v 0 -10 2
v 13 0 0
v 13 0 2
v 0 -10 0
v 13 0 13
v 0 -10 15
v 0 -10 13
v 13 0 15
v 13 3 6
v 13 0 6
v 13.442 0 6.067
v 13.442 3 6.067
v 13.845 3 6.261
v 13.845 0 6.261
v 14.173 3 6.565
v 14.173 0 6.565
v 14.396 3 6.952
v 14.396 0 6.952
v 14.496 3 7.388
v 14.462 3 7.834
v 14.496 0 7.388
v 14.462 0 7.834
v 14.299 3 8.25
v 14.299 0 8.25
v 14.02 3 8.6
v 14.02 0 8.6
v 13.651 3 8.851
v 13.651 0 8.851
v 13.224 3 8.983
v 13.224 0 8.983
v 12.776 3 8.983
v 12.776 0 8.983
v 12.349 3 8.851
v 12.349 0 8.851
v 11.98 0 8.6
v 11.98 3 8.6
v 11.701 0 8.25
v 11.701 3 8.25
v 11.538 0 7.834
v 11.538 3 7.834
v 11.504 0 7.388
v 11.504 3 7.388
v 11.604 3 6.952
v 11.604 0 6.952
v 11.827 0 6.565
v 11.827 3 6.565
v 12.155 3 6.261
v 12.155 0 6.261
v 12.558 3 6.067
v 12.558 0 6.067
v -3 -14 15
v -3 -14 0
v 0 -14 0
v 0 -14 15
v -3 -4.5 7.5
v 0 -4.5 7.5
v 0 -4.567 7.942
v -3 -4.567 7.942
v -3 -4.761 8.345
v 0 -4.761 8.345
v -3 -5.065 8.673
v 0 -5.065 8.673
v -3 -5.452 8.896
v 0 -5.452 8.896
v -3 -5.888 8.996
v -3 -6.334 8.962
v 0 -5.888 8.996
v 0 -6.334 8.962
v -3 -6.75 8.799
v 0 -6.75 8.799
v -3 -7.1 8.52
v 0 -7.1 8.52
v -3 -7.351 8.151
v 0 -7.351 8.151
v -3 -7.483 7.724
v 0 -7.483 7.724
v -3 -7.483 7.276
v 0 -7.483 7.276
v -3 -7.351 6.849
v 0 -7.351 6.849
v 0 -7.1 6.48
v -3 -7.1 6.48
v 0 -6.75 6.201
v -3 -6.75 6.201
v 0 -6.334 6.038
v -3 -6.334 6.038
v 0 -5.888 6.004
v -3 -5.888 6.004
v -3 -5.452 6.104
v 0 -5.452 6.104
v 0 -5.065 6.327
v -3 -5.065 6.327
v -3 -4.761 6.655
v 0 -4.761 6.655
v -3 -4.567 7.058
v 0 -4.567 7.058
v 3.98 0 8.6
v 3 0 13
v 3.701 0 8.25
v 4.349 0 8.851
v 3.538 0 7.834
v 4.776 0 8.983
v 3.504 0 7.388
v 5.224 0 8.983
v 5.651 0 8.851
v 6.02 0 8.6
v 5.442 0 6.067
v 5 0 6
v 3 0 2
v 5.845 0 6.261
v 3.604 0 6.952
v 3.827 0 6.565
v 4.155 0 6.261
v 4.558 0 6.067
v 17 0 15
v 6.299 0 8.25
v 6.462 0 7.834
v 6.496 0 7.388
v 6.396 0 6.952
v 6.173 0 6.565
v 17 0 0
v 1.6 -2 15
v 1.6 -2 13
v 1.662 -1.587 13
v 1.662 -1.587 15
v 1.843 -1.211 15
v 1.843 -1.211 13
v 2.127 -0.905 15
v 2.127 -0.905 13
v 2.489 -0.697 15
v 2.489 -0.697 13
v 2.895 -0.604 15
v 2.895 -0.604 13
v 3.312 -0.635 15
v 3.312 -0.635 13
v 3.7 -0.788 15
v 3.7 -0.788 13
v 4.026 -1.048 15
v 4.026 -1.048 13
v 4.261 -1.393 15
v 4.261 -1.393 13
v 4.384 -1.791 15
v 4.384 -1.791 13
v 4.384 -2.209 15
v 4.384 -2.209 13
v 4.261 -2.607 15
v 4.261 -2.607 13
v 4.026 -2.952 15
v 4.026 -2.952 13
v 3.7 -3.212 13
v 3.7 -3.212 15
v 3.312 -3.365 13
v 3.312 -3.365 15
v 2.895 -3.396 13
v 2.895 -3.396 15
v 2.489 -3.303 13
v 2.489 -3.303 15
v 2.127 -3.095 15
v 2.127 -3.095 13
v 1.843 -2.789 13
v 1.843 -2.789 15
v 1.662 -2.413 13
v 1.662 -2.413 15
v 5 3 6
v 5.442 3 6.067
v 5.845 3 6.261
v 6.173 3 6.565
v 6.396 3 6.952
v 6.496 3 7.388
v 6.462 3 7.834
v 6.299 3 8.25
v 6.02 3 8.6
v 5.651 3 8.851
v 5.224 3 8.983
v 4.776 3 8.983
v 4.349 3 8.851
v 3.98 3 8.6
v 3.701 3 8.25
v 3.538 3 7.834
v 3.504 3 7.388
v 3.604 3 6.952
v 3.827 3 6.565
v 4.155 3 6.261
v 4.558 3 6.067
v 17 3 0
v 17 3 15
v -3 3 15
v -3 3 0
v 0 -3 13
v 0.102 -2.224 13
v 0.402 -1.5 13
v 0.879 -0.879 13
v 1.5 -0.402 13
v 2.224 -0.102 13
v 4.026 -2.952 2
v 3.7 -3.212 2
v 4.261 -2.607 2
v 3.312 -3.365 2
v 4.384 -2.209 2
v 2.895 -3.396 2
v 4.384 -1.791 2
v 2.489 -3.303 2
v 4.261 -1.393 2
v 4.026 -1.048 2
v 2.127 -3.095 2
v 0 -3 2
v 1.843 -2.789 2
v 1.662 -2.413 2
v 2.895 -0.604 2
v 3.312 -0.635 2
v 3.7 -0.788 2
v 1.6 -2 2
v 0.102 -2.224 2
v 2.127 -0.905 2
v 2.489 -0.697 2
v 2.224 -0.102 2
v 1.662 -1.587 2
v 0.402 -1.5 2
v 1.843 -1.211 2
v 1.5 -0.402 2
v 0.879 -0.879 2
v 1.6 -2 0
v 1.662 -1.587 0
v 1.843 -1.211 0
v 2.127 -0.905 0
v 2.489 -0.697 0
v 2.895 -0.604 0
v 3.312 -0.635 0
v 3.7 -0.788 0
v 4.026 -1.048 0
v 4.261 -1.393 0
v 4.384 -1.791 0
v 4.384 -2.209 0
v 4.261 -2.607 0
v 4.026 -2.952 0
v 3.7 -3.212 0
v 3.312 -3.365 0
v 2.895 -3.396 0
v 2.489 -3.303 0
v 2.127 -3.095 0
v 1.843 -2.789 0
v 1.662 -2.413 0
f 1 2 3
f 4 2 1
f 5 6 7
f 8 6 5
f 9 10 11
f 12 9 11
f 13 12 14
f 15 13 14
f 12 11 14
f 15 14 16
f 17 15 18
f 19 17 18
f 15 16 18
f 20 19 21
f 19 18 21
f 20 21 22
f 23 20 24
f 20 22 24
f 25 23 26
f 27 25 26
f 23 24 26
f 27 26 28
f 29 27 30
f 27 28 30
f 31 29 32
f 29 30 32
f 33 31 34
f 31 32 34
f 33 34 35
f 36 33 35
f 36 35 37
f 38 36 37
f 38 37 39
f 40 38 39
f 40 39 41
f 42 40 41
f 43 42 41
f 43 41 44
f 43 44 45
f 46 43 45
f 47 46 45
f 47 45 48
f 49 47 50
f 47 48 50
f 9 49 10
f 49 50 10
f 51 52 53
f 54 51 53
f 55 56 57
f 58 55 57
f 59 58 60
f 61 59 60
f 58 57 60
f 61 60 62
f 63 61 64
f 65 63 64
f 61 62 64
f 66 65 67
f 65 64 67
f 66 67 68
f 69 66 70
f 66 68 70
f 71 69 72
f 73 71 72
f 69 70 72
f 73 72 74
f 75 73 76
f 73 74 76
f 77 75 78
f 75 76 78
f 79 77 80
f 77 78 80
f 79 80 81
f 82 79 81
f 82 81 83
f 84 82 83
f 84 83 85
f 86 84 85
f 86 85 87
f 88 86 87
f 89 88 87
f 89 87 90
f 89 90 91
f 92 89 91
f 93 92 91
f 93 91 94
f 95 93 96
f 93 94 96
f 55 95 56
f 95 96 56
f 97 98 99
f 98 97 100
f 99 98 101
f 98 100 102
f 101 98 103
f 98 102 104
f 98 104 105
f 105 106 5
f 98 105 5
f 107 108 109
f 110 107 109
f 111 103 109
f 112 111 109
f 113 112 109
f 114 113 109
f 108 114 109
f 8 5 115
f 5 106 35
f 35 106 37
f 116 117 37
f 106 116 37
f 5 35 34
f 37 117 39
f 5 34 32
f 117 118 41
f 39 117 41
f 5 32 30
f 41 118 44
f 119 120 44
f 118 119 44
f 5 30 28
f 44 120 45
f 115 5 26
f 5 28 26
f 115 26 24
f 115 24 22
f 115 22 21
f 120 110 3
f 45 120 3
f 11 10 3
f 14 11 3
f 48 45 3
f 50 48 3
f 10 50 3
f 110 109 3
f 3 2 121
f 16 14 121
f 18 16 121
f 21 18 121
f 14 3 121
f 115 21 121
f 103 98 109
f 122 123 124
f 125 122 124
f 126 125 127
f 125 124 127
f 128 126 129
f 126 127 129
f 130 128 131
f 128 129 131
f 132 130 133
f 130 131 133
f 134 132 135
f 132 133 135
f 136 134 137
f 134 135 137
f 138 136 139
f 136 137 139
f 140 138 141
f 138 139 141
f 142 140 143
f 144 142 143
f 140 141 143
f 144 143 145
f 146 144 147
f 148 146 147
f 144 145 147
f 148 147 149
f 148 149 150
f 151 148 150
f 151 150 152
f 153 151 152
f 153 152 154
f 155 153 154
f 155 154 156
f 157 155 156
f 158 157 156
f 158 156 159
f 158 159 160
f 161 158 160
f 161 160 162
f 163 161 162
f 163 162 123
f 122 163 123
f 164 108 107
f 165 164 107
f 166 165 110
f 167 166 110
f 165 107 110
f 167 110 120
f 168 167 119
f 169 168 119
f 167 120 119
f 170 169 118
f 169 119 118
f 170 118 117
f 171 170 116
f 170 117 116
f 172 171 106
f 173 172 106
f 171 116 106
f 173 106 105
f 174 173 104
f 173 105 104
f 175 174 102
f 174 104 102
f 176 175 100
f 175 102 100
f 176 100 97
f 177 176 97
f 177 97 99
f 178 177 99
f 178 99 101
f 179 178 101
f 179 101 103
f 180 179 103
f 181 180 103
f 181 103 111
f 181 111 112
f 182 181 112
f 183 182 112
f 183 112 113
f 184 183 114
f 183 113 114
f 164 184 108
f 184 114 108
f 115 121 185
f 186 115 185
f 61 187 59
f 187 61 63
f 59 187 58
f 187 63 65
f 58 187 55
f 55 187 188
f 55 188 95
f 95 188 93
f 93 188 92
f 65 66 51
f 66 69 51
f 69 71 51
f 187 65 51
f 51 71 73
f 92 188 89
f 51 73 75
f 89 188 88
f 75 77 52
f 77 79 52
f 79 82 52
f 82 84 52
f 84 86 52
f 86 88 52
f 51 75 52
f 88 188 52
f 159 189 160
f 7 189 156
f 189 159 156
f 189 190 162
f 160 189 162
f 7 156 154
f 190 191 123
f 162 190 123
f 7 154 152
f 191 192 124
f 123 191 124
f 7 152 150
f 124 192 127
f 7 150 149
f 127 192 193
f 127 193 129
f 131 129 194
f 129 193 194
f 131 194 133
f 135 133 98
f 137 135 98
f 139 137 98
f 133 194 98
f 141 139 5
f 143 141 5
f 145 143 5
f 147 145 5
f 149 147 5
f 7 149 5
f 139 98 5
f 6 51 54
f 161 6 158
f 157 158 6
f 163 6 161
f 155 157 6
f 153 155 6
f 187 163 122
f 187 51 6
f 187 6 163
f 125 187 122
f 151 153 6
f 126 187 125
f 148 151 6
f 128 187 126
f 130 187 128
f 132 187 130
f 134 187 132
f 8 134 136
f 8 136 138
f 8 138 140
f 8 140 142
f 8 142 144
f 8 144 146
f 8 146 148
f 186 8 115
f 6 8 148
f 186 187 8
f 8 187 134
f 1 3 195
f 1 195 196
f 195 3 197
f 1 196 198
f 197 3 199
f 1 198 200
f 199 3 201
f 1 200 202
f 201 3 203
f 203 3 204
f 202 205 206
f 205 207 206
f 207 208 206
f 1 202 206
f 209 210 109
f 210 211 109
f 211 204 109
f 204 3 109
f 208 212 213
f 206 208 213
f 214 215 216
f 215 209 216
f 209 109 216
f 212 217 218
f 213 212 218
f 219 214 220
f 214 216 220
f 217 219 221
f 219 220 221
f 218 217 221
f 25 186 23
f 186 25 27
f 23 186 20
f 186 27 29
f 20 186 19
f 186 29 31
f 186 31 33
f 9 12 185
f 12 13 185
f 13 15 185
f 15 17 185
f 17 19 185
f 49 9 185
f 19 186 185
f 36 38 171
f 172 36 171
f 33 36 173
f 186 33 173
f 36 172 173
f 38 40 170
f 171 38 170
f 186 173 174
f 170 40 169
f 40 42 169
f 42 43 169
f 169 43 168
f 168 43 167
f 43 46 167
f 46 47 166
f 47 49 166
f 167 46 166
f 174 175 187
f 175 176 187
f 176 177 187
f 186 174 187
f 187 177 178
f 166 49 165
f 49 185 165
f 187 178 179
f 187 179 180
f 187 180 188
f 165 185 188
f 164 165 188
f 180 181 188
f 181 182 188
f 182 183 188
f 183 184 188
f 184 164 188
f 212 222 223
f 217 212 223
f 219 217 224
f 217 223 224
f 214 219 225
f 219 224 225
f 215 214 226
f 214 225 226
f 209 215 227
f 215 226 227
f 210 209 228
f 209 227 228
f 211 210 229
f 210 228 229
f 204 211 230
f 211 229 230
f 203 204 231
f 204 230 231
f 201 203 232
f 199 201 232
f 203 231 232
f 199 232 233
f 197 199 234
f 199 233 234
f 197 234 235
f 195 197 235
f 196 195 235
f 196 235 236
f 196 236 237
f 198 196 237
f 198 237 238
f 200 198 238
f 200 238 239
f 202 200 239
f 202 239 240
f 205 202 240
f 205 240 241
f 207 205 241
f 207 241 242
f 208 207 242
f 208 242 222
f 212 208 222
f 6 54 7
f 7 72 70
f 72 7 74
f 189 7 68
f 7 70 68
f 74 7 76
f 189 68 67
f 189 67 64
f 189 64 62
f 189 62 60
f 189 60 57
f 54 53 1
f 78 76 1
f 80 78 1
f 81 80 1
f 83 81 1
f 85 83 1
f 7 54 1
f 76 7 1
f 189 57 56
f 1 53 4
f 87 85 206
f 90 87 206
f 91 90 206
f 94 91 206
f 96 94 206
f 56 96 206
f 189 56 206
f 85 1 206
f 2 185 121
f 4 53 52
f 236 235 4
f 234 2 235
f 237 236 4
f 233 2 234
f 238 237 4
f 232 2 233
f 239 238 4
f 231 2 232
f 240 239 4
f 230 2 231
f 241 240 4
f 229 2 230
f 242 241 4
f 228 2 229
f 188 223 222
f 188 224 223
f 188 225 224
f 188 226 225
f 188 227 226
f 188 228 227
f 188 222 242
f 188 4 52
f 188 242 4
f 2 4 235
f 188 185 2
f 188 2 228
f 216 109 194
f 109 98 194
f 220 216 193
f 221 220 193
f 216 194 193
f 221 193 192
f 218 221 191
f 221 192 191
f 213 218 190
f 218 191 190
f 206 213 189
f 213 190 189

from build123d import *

# Parameters (mm, degrees)
EXTRUDE_1_DEPTH     = 15
SKETCH_2_R          = 1.5
CUT_EXTRUDE_1_DEPTH = 3
SKETCH_3_R          = 1.5
CUT_EXTRUDE_2_DEPTH = 3
EXTRUDE_2_DEPTH     = 2
EXTRUDE_3_DEPTH     = 2
SKETCH_6_R          = 1.4
CUT_EXTRUDE_3_DEPTH = 27.645825189
FILLET_1_R          = 3


with BuildPart() as part:
    # 草图1 → 凸台-拉伸1 (new body)
    with BuildSketch(Plane.XY):
        Polygon((0, -14), (0, 0), (17, 0), (17, 3), (-3, 3), (-3, -14), align=None)
    extrude(amount=EXTRUDE_1_DEPTH)

    # 草图2 → 切除-拉伸1 (cut)
    with BuildSketch(Plane(origin=(0, 0, 0), x_dir=(0, 0, -1), z_dir=(1, 0, 0))):
        with Locations(Location((-7.5, -6, 0), (0, 0, 90))):
            Circle(SKETCH_2_R)
    extrude(amount=-CUT_EXTRUDE_1_DEPTH, mode=Mode.SUBTRACT)

    # 草图3 → 切除-拉伸2 (cut)
    with BuildSketch(Plane.XZ):
        with Locations(Location((13, 7.5, 0), (0, 0, 270))):
            Circle(SKETCH_3_R)
        with Locations(Location((5, 7.5, 0), (0, 0, 270))):
            Circle(SKETCH_3_R)
    extrude(amount=-CUT_EXTRUDE_2_DEPTH, mode=Mode.SUBTRACT)

    # 草图4 → 凸台-拉伸2 (add)
    with BuildSketch(Plane.XY.offset(15)):
        Polygon((0, 0), (0, -10), (13, 0), align=None)
    extrude(amount=-EXTRUDE_2_DEPTH)

    # 草图5 → 凸台-拉伸3 (add)
    with BuildSketch(Plane(origin=(0, 0, 0), x_dir=(-1, 0, 0), z_dir=(0, 0, -1))):
        Polygon((0, 0), (-13, 0), (0, -10), align=None)
    extrude(amount=-EXTRUDE_3_DEPTH)

    # 草图6 → 切除-拉伸3 (cut, through all)
    with BuildSketch(Plane(origin=(0, 0, 0), x_dir=(-1, 0, 0), z_dir=(0, 0, -1))):
        with Locations((-3, -2)):
            Circle(SKETCH_6_R)
    extrude(amount=-CUT_EXTRUDE_3_DEPTH, mode=Mode.SUBTRACT)

    # 圆角1
    fillet_1_edges = [part.edges().sort_by_distance(p)[0] for p in [
        (0, 0, 7.5),
    ]]
    fillet(fillet_1_edges, radius=FILLET_1_R)


solid = part.part
